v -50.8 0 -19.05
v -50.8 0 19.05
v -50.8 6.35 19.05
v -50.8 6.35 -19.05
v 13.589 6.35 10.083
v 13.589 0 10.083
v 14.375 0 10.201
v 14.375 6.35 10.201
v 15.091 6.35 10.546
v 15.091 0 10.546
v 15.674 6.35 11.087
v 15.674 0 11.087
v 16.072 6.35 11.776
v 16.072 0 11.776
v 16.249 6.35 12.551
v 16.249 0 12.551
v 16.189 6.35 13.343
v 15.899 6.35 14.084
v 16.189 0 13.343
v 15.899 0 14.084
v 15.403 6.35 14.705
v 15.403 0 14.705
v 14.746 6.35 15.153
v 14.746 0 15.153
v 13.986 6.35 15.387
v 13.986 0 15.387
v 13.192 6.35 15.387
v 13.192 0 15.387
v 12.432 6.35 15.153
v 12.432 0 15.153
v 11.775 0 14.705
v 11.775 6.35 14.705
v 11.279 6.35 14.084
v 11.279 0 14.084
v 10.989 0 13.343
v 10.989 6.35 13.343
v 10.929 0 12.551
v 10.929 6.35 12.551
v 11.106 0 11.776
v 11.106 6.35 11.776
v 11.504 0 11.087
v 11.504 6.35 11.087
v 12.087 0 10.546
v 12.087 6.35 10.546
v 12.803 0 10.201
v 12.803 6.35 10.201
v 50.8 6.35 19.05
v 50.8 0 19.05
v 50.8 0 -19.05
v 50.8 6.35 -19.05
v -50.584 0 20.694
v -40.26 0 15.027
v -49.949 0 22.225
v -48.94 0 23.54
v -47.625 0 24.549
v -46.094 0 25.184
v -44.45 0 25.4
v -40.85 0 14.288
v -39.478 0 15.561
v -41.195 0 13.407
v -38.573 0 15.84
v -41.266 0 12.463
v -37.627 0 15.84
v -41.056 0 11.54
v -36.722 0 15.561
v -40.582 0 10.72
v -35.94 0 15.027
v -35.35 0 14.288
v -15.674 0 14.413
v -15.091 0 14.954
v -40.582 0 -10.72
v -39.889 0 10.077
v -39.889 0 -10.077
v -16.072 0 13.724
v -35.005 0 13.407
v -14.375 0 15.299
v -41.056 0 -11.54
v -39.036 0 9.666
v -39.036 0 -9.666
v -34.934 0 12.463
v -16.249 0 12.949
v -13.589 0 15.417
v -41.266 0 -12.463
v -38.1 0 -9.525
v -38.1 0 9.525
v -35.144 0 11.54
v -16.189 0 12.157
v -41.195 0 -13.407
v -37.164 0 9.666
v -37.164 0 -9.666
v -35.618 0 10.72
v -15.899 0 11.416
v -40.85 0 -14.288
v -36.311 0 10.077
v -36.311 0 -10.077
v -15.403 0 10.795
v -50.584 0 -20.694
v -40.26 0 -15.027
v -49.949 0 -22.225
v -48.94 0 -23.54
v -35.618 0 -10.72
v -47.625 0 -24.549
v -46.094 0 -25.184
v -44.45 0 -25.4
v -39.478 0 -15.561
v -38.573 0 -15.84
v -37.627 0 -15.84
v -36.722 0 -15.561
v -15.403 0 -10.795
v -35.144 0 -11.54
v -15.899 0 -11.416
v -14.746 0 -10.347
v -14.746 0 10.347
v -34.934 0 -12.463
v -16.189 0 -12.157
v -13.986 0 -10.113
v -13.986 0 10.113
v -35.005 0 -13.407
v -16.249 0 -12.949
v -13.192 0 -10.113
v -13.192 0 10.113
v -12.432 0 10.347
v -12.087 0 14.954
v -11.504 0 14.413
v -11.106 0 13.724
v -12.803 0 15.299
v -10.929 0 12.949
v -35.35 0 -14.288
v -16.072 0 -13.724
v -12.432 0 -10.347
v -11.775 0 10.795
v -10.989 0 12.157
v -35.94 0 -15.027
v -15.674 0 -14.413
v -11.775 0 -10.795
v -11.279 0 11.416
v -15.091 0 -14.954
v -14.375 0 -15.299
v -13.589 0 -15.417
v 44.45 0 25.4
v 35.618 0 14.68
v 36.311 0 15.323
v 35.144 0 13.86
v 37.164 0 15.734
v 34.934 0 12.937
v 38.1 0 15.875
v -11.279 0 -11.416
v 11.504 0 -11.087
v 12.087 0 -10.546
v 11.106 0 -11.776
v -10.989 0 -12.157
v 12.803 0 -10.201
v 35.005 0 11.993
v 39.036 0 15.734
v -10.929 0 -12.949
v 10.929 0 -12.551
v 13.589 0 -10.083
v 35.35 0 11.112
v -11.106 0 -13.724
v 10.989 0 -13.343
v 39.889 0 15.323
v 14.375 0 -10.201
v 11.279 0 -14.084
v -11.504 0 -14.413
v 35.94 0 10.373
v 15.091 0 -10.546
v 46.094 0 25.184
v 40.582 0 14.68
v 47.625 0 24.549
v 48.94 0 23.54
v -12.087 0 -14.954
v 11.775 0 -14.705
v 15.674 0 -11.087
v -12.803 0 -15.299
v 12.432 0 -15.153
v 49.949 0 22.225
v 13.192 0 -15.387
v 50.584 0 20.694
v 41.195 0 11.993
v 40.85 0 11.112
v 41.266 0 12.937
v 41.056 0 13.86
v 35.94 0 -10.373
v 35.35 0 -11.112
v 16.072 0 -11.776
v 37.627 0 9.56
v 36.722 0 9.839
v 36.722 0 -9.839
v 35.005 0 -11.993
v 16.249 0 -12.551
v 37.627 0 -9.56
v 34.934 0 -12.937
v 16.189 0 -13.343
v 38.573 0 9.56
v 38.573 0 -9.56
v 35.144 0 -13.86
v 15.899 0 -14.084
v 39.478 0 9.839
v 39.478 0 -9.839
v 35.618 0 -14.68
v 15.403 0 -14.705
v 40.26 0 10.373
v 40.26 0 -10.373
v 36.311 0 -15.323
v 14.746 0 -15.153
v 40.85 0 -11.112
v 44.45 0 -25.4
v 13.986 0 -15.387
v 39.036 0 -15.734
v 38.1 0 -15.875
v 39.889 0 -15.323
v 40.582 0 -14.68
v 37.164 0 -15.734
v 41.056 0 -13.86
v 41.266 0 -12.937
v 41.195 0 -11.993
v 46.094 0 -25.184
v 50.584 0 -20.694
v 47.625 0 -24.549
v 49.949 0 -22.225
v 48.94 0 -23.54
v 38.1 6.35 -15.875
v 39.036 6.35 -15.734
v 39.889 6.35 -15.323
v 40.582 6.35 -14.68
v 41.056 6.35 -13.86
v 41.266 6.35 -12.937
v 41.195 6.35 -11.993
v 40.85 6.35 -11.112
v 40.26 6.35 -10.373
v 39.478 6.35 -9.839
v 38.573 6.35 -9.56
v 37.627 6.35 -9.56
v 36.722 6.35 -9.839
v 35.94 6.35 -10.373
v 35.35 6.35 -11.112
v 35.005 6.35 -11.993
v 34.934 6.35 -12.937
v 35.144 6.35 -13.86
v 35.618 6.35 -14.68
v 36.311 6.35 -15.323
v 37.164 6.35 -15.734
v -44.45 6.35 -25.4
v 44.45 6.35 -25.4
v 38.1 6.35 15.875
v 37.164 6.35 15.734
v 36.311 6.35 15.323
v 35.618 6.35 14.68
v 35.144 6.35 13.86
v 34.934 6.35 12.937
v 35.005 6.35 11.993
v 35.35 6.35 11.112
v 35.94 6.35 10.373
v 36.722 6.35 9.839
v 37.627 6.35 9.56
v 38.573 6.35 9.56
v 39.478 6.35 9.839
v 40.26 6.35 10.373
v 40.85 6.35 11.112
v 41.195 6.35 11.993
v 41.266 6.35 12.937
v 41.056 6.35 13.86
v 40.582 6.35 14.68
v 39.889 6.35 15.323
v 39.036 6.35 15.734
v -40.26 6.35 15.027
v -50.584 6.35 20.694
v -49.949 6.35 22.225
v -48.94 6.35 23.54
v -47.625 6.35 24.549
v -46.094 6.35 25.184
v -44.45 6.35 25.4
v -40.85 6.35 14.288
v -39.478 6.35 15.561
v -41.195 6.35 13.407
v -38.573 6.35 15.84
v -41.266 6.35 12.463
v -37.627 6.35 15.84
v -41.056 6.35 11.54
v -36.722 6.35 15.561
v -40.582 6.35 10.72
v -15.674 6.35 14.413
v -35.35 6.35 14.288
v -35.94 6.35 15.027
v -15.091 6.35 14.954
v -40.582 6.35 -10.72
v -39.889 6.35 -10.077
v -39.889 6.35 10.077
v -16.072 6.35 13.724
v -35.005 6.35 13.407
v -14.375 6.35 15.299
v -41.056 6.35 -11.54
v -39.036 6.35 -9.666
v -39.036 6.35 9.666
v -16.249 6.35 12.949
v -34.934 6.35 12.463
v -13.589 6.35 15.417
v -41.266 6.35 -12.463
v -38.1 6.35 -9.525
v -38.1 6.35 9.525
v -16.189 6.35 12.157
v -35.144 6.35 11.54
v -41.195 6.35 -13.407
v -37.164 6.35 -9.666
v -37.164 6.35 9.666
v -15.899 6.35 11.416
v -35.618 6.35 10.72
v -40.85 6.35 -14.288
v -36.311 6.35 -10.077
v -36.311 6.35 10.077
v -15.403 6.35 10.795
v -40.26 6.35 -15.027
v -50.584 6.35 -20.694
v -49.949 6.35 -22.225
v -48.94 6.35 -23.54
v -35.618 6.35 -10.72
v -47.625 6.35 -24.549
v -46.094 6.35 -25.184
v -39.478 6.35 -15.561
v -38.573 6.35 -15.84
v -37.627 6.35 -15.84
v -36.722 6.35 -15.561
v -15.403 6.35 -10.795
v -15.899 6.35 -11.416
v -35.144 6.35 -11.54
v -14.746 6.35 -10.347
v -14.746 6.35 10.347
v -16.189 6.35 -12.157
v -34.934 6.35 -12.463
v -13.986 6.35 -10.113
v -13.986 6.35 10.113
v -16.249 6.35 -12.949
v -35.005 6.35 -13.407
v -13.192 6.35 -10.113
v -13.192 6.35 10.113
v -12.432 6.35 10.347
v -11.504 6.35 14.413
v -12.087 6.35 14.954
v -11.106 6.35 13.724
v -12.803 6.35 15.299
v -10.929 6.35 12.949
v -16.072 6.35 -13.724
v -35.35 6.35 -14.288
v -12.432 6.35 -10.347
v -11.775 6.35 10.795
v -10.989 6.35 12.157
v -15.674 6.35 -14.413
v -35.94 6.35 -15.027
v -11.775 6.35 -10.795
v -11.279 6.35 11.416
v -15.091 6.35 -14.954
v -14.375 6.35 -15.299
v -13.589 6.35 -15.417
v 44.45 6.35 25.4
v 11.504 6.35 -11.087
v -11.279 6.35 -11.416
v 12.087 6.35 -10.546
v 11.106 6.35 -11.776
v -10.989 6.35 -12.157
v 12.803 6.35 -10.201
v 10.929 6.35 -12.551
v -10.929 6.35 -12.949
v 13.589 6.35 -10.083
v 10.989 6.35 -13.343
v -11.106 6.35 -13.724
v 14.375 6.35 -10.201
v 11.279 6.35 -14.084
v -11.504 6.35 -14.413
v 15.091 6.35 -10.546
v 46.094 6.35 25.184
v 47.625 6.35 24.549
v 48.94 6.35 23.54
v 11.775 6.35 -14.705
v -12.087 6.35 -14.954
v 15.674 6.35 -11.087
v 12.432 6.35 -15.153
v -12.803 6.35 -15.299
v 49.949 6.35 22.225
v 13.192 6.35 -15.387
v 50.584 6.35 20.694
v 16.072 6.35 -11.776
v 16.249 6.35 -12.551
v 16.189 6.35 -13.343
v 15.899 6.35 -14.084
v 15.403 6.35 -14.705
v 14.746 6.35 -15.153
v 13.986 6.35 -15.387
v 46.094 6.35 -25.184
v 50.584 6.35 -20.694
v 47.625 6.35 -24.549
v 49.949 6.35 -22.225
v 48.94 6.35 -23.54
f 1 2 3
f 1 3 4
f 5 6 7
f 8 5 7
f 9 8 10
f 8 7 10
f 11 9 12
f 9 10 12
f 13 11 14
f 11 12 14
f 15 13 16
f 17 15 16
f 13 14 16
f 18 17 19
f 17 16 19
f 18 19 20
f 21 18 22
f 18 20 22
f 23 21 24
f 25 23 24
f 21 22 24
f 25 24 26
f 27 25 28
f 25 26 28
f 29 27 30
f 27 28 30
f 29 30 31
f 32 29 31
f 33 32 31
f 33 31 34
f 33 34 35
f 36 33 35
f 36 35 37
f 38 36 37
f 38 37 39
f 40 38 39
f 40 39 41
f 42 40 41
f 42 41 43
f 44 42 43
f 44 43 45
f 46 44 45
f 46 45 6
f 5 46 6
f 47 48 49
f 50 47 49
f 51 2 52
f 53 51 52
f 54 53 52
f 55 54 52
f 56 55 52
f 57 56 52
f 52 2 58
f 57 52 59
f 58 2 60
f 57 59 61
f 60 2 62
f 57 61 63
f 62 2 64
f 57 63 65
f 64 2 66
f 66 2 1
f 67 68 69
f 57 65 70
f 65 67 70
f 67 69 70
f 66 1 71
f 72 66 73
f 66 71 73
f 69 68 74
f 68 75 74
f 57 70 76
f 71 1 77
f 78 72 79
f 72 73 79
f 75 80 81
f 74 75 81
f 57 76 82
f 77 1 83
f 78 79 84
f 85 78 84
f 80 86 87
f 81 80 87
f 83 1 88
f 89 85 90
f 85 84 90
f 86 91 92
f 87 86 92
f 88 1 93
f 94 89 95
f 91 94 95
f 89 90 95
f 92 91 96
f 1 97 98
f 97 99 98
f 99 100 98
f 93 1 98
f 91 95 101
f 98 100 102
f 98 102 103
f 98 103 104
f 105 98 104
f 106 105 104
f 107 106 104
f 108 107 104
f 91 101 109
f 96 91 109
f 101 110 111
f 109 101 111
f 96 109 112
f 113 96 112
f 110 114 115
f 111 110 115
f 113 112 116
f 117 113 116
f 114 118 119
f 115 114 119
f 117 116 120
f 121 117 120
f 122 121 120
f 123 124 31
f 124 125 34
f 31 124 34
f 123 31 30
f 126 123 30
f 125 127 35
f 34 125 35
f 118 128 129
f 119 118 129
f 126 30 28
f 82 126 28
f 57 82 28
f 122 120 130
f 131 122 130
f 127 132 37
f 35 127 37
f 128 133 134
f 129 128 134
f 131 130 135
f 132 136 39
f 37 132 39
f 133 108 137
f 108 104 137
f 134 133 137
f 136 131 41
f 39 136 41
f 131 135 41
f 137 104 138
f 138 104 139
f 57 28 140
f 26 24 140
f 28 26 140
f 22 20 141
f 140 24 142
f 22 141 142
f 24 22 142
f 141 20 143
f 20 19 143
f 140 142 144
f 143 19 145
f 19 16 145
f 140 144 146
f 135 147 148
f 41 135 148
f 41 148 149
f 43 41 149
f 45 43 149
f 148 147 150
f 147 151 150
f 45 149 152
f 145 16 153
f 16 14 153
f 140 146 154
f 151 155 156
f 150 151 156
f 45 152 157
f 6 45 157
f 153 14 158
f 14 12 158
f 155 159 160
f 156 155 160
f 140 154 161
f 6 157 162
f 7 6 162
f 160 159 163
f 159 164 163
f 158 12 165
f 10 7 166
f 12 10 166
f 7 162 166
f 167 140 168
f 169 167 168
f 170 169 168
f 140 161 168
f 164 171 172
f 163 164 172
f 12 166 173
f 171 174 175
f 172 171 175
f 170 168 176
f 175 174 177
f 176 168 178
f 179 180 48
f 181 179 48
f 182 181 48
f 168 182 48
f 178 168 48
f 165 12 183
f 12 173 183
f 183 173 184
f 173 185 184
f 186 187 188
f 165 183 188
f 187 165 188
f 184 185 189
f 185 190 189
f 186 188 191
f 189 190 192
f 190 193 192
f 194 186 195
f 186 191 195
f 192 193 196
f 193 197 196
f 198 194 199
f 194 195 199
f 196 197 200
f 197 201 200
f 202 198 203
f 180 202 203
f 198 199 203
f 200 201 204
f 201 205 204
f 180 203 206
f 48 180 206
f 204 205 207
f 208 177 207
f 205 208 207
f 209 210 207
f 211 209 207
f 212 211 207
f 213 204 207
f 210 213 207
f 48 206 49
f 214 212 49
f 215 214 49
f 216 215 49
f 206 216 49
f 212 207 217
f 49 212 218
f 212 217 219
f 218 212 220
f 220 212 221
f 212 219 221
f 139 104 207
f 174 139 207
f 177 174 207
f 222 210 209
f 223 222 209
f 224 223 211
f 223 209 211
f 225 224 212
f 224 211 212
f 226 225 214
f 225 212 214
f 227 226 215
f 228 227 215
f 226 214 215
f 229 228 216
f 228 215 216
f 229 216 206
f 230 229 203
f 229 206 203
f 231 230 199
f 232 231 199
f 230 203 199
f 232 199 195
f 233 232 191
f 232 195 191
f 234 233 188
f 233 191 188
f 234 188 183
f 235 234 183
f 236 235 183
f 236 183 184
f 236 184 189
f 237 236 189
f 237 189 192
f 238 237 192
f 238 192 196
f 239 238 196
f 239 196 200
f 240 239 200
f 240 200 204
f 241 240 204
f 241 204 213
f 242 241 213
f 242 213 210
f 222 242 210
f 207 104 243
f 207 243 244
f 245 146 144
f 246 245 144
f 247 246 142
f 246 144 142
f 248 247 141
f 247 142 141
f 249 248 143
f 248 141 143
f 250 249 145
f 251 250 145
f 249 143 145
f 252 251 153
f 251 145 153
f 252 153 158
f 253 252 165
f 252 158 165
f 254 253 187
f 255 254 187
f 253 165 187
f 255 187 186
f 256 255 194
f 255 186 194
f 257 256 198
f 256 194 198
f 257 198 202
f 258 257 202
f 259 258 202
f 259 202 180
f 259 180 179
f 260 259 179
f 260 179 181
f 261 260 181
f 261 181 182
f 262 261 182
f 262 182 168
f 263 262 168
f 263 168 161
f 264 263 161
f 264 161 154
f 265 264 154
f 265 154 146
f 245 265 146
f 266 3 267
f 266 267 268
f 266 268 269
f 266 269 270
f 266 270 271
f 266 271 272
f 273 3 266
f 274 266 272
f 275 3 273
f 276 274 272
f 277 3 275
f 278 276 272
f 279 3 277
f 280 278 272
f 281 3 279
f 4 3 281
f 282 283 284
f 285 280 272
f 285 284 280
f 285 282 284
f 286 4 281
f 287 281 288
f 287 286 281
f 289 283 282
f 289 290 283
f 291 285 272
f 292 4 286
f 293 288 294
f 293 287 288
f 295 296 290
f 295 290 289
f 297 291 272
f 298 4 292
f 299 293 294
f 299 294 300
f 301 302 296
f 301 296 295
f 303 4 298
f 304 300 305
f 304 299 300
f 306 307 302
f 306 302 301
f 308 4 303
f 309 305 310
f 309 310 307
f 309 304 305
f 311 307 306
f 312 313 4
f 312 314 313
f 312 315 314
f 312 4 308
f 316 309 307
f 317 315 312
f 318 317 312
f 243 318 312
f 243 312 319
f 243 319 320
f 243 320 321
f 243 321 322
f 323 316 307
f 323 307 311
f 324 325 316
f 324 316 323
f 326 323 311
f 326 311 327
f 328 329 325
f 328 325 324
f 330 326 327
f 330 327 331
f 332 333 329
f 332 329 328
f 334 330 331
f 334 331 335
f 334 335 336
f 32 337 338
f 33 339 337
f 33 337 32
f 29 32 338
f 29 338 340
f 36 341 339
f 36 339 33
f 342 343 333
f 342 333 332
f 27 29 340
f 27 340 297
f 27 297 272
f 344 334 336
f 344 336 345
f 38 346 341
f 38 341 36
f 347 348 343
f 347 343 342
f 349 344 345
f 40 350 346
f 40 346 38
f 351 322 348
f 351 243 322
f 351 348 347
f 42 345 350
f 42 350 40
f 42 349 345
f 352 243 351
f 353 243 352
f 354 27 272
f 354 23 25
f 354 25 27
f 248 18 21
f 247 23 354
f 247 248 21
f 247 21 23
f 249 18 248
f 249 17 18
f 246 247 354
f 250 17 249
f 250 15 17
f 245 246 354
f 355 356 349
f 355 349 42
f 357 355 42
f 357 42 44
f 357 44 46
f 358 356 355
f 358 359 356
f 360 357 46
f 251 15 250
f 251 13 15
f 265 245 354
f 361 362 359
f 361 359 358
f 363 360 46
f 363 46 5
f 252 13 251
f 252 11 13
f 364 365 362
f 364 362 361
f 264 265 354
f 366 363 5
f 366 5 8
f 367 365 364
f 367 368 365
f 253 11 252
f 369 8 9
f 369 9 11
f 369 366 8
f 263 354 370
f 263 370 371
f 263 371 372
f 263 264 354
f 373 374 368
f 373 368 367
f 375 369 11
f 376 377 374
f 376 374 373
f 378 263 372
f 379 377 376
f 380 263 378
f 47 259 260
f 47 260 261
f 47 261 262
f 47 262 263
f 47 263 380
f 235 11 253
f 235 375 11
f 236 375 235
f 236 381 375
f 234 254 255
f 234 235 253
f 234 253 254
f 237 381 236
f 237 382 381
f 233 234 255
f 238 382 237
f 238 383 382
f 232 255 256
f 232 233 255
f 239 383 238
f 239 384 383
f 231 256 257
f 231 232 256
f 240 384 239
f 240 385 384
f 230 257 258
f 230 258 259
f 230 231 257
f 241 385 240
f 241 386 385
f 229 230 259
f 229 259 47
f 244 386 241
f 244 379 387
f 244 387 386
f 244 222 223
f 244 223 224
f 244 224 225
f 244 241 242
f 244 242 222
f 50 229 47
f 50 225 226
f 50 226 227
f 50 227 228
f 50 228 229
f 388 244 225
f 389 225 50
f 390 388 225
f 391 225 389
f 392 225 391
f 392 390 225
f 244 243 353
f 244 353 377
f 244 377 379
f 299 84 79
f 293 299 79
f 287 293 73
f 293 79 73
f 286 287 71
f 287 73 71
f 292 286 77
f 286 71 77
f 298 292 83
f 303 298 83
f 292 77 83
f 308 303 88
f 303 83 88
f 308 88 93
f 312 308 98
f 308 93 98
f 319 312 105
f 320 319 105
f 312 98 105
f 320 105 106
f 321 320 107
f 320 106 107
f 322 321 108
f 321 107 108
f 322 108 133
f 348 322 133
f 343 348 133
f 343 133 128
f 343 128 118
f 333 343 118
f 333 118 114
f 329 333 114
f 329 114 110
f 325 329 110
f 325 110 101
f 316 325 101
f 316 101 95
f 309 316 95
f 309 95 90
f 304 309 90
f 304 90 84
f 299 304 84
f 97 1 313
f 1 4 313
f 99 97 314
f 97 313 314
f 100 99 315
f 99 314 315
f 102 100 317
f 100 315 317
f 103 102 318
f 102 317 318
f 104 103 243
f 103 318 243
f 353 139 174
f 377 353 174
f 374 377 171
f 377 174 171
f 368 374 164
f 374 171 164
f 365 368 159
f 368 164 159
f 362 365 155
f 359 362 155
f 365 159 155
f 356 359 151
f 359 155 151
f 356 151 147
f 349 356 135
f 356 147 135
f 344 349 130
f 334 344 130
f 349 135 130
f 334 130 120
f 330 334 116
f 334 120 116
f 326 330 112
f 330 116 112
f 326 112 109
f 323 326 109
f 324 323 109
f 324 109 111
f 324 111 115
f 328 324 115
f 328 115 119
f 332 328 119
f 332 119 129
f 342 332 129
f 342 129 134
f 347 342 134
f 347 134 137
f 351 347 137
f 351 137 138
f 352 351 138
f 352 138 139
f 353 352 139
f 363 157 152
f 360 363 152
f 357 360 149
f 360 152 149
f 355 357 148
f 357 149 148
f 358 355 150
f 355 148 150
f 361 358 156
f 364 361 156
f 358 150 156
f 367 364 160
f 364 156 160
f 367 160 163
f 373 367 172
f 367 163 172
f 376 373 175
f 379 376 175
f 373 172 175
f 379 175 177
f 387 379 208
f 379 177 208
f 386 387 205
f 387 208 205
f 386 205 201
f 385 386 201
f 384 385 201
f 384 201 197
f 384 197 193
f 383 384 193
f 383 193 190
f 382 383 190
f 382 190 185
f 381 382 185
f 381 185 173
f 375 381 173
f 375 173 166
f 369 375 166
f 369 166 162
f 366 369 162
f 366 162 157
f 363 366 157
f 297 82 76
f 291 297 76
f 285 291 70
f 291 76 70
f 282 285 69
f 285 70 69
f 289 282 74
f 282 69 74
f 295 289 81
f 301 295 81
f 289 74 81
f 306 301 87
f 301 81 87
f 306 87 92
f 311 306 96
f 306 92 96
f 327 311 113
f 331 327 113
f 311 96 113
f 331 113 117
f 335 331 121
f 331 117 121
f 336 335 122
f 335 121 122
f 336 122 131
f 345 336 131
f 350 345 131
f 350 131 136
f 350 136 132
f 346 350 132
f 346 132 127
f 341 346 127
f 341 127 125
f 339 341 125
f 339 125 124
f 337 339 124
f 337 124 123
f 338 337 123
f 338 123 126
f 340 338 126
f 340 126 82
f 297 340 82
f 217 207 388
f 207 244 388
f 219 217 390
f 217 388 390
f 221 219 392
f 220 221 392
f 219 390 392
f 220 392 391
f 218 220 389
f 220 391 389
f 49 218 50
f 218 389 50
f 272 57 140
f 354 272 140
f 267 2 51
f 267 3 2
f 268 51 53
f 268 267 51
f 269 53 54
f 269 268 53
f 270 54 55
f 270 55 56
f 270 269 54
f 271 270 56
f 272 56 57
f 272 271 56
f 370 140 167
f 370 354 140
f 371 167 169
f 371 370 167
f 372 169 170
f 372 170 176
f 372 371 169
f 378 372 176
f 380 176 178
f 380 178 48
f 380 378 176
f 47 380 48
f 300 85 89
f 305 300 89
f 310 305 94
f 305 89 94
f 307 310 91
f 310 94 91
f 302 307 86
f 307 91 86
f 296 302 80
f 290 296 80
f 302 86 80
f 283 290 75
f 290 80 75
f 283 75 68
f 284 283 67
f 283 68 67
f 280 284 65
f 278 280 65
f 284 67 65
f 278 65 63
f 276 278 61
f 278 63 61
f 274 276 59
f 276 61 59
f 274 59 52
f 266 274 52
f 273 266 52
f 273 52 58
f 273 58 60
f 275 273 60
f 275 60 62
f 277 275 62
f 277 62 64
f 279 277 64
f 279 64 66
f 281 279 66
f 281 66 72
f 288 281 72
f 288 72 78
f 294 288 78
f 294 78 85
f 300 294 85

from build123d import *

# Parameters (mm, degrees)
SKETCH1_W           = 101.6
SKETCH1_H           = 50.8
BOSS_EXTRUDE1_DEPTH = 6.35
CUT_EXTRUDE2_REACH  = 59.15
SKETCH3_R           = 3.175
SKETCH3_R_2         = 2.667
FILLET1_R           = 6.35


with BuildPart() as part:
    # Sketch1 → Boss-Extrude1 (new body)
    with BuildSketch(Plane(origin=(0, 0, 0), x_dir=(1, 0, 0), z_dir=(0, 1, 0))):
        Rectangle(SKETCH1_W, SKETCH1_H)
    extrude(amount=BOSS_EXTRUDE1_DEPTH)

    # Sketch3 → Cut-Extrude2 (cut, up to next)
    with BuildSketch(Plane.XZ, mode=Mode.PRIVATE) as cut_extrude2_sk1:
        with Locations(Location((-38.1, 12.7, 0), (0, 0, 270))):
            Circle(SKETCH3_R)
    cut_extrude2_tool1 = extrude(cut_extrude2_sk1.sketch, amount=-CUT_EXTRUDE2_REACH, mode=Mode.PRIVATE) & part.part
    # Sketch3 → Cut-Extrude2 (cut, up to next)
    with BuildSketch(Plane.XZ, mode=Mode.PRIVATE) as cut_extrude2_sk2:
        with Locations(Location((-38.1, -12.7, 0), (0, 0, 90))):
            Circle(SKETCH3_R)
    cut_extrude2_tool2 = extrude(cut_extrude2_sk2.sketch, amount=-CUT_EXTRUDE2_REACH, mode=Mode.PRIVATE) & part.part
    # Sketch3 → Cut-Extrude2 (cut, up to next)
    with BuildSketch(Plane.XZ, mode=Mode.PRIVATE) as cut_extrude2_sk3:
        with Locations(Location((38.1, 12.7, 0), (0, 0, 90))):
            Circle(SKETCH3_R)
    cut_extrude2_tool3 = extrude(cut_extrude2_sk3.sketch, amount=-CUT_EXTRUDE2_REACH, mode=Mode.PRIVATE) & part.part
    # Sketch3 → Cut-Extrude2 (cut, up to next)
    with BuildSketch(Plane.XZ, mode=Mode.PRIVATE) as cut_extrude2_sk4:
        with Locations(Location((38.1, -12.7, 0), (0, 0, 270))):
            Circle(SKETCH3_R)
    cut_extrude2_tool4 = extrude(cut_extrude2_sk4.sketch, amount=-CUT_EXTRUDE2_REACH, mode=Mode.PRIVATE) & part.part
    # Sketch3 → Cut-Extrude2 (cut, up to next)
    with BuildSketch(Plane.XZ, mode=Mode.PRIVATE) as cut_extrude2_sk5:
        with Locations(Location((13.589, -12.75, 0), (0, 0, 90))):
            Circle(SKETCH3_R_2)
    cut_extrude2_tool5 = extrude(cut_extrude2_sk5.sketch, amount=-CUT_EXTRUDE2_REACH, mode=Mode.PRIVATE) & part.part
    # Sketch3 → Cut-Extrude2 (cut, up to next)
    with BuildSketch(Plane.XZ, mode=Mode.PRIVATE) as cut_extrude2_sk6:
        with Locations(Location((-13.589, -12.75, 0), (0, 0, 270))):
            Circle(SKETCH3_R_2)
    cut_extrude2_tool6 = extrude(cut_extrude2_sk6.sketch, amount=-CUT_EXTRUDE2_REACH, mode=Mode.PRIVATE) & part.part
    # Sketch3 → Cut-Extrude2 (cut, up to next)
    with BuildSketch(Plane.XZ, mode=Mode.PRIVATE) as cut_extrude2_sk7:
        with Locations(Location((13.589, 12.75, 0), (0, 0, 270))):
            Circle(SKETCH3_R_2)
    cut_extrude2_tool7 = extrude(cut_extrude2_sk7.sketch, amount=-CUT_EXTRUDE2_REACH, mode=Mode.PRIVATE) & part.part
    # Sketch3 → Cut-Extrude2 (cut, up to next)
    with BuildSketch(Plane.XZ, mode=Mode.PRIVATE) as cut_extrude2_sk8:
        with Locations(Location((-13.589, 12.75, 0), (0, 0, 90))):
            Circle(SKETCH3_R_2)
    cut_extrude2_tool8 = extrude(cut_extrude2_sk8.sketch, amount=-CUT_EXTRUDE2_REACH, mode=Mode.PRIVATE) & part.part
    add(cut_extrude2_tool1.solids().sort_by_distance((-38.1, 0, 12.7))[0], mode=Mode.SUBTRACT)
    add(cut_extrude2_tool2.solids().sort_by_distance((-38.1, 0, -12.7))[0], mode=Mode.SUBTRACT)
    add(cut_extrude2_tool3.solids().sort_by_distance((38.1, 0, 12.7))[0], mode=Mode.SUBTRACT)
    add(cut_extrude2_tool4.solids().sort_by_distance((38.1, 0, -12.7))[0], mode=Mode.SUBTRACT)
    add(cut_extrude2_tool5.solids().sort_by_distance((13.589, 0, -12.75))[0], mode=Mode.SUBTRACT)
    add(cut_extrude2_tool6.solids().sort_by_distance((-13.589, 0, -12.75))[0], mode=Mode.SUBTRACT)
    add(cut_extrude2_tool7.solids().sort_by_distance((13.589, 0, 12.75))[0], mode=Mode.SUBTRACT)
    add(cut_extrude2_tool8.solids().sort_by_distance((-13.589, 0, 12.75))[0], mode=Mode.SUBTRACT)

    # Fillet1
    fillet1_edges = [part.edges().sort_by_distance(p)[0] for p in [
        (50.8, 3.175, 25.4),
        (-50.8, 3.175, 25.4),
        (-50.8, 3.175, -25.4),
        (50.8, 3.175, -25.4),
    ]]
    fillet(fillet1_edges, radius=FILLET1_R)


solid = part.part
